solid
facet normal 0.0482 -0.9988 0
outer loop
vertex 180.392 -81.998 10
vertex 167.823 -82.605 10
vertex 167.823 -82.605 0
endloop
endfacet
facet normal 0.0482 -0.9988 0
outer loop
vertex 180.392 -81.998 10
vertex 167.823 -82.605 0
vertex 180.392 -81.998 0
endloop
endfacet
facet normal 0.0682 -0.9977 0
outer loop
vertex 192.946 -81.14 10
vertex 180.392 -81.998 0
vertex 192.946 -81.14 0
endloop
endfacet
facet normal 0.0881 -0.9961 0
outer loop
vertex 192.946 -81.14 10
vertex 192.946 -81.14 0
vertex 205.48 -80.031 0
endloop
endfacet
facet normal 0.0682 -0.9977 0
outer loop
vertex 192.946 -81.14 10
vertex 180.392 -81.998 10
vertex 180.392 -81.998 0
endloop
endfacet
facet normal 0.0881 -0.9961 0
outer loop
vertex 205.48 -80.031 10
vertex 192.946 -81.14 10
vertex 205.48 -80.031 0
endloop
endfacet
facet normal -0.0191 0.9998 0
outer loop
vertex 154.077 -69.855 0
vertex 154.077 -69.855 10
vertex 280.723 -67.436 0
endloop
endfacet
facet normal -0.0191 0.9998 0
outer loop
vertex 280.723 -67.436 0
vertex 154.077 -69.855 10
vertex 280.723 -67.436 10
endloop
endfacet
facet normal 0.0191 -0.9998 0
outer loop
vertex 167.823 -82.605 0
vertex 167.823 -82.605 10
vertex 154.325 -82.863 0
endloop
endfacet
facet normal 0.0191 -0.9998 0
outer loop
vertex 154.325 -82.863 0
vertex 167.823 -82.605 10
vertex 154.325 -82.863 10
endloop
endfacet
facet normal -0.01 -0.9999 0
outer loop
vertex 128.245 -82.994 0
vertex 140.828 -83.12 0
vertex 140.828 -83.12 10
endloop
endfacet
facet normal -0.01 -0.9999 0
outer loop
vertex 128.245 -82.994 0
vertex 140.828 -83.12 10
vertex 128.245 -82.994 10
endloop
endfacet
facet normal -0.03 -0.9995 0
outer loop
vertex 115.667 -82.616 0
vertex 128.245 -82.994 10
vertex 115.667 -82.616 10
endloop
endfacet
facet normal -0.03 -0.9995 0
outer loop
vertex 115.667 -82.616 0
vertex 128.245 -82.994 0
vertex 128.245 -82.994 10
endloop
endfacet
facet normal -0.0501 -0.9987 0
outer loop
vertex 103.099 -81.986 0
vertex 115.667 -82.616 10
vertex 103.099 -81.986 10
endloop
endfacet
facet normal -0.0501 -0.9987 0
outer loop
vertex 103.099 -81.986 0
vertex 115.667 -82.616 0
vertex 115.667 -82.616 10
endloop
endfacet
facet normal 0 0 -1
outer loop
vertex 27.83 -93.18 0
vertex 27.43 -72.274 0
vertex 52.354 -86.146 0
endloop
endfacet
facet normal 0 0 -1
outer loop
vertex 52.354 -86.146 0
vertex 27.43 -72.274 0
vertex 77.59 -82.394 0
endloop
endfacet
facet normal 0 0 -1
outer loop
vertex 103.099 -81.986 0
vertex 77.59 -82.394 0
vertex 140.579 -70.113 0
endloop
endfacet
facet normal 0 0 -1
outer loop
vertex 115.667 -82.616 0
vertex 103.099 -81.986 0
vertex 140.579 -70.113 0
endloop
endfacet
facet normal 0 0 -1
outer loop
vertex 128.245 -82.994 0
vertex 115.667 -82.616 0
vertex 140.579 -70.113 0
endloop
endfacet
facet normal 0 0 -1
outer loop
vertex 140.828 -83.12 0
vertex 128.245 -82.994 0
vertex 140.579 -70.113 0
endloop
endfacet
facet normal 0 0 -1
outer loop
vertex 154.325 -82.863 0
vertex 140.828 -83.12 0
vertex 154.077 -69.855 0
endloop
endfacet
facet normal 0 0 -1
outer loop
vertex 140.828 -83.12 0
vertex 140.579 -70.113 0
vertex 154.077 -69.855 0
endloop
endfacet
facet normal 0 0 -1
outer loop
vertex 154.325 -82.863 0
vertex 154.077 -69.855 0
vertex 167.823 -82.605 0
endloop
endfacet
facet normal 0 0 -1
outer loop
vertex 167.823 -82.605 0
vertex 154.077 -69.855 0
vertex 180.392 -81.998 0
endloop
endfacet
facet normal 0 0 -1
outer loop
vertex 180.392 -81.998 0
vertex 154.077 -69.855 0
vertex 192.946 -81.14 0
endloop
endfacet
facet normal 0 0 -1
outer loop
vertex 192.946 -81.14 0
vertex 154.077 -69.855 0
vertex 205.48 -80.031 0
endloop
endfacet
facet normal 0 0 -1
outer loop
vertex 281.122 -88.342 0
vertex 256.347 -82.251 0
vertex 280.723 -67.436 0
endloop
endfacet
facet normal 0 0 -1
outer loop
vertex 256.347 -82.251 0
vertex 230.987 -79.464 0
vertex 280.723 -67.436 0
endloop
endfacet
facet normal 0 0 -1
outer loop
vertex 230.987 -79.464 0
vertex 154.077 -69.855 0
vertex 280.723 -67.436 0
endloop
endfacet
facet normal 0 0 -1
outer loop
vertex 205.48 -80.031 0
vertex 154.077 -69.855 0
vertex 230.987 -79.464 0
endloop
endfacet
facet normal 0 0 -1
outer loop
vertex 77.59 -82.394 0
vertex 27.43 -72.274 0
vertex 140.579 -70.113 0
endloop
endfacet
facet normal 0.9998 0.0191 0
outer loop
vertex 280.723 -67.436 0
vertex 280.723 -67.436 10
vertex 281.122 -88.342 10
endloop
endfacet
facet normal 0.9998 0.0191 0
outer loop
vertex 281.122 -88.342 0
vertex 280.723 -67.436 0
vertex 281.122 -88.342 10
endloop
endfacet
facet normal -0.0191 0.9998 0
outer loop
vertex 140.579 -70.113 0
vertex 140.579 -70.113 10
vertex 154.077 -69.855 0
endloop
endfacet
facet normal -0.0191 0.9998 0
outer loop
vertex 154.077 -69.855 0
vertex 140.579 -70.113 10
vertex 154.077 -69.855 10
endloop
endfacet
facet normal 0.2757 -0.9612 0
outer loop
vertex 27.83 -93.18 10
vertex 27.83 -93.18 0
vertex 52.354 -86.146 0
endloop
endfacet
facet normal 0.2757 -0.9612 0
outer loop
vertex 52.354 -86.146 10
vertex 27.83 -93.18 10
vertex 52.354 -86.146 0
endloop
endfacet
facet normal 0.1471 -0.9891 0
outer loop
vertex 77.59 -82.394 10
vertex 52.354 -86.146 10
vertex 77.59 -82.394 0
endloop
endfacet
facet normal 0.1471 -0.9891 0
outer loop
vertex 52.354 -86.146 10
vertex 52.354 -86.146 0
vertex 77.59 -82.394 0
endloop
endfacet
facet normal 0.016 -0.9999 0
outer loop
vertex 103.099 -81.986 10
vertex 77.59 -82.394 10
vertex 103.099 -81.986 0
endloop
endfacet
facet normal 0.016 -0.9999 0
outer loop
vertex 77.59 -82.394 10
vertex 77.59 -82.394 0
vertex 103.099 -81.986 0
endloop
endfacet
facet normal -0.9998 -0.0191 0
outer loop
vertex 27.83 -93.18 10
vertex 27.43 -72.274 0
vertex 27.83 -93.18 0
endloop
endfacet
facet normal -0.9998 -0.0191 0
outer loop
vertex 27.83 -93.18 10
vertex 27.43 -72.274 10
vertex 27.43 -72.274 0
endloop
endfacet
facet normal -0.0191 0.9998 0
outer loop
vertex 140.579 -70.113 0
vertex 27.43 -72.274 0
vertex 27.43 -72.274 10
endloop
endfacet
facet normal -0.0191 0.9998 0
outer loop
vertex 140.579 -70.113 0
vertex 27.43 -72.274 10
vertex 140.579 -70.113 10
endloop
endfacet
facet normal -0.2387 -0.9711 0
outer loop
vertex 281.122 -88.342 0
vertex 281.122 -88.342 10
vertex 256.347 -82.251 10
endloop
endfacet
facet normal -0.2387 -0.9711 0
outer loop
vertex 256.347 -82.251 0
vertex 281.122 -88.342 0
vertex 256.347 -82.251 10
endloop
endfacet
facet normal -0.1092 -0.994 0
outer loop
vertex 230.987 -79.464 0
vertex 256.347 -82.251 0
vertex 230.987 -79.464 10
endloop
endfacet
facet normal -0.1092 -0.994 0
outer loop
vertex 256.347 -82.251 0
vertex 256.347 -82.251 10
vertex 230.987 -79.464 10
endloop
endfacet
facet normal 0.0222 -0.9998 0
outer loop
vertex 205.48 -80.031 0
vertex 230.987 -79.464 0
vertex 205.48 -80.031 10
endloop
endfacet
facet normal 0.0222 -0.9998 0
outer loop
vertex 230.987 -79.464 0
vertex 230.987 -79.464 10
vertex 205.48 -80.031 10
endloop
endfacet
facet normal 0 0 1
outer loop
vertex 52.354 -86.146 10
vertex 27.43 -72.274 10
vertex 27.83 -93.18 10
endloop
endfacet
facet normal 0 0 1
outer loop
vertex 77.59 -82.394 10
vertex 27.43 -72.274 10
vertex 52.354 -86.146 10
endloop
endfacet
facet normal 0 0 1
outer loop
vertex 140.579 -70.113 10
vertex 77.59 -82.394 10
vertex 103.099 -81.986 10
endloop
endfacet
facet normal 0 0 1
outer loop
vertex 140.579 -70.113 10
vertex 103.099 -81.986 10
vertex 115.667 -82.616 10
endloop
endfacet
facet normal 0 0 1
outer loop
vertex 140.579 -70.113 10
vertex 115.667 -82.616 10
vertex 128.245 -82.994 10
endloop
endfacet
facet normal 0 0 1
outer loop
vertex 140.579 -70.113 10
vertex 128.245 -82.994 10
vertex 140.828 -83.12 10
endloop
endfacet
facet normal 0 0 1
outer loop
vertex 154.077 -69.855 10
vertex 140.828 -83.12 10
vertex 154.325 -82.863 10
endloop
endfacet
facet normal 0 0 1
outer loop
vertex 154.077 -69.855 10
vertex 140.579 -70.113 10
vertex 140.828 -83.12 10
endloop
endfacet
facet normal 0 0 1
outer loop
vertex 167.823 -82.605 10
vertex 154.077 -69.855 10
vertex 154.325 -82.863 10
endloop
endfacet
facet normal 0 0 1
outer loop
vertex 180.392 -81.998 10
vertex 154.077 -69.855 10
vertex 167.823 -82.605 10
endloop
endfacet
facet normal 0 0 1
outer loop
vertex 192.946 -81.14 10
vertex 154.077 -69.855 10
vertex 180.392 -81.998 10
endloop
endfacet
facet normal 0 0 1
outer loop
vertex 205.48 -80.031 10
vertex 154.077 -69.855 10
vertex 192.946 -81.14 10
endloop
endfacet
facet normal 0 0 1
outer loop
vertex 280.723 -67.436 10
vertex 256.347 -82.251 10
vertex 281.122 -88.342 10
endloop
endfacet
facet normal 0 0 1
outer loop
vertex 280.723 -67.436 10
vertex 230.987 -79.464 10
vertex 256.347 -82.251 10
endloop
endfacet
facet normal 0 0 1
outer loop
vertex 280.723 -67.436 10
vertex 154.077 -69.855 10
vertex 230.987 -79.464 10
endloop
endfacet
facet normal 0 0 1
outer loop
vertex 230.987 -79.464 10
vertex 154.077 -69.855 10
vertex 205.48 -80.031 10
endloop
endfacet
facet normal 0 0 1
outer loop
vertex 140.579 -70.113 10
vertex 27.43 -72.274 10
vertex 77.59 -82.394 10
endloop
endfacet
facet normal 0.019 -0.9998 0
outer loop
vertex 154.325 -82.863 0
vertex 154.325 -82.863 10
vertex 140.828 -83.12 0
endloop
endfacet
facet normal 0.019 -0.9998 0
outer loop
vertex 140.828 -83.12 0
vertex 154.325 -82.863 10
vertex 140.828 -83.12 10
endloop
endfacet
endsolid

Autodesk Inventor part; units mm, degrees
ref_plane "YZ Plane" through (0, 0, 0) normal (1, 0, 0) x (0, 1, 0)
ref_plane "XZ Plane" through (0, 0, 0) normal (0, 1, 0) x (-1, 0, 0)
ref_plane "XY Plane" through (0, 0, 0) normal (0, 0, 1) x (1, 0, 0)
sketch "Sketch1" plane through (0, 0, 0) normal (0, 0, 1) x (1, 0, 0)
  line L0 (0, 0) -> (293.4944, 0) construction
  line L1 (293.4944, 0) -> (293.4944, -132.0217) construction
  line L2 (293.4944, -132.0217) -> (0, -132.0217) construction
  line L3 (0, -132.0217) -> (0, 0) construction
  line L4 (79.3681, -56.3049) -> (159.3681, -56.3049) construction
  line L5 (283.1562, -93.1287) -> (274.2161, -88.6482) construction
  line L6 (283.1562, -93.1287) -> (282.3201, -93.1287) construction
  line L7 (18.3483, -97.5091) -> (27.4302, -93.3236) construction
  line L8 (18.3483, -97.5091) -> (20.5956, -97.5091) construction
  arc A0 (103.0994, -81.9859) -> (27.4302, -93.3236) centre (93.4367, -275.677) ccw
  arc A1 (274.2161, -88.6482) -> (204.4098, -79.893) centre (217.7822, -255.937) ccw
  arc A2 (103.0994, -81.9859) -> (204.4098, -79.893) centre (140.8276, 544.7964) ccw
  line L9 (27.4302, -93.3236) -> (27.4302, -72.2735)
  line L10 (27.4302, -72.2735) -> (272.6166, -67.591)
  line L11 (272.6166, -67.591) -> (274.2161, -88.6482)
  line L12 (103.0994, -81.9859) -> (86.3195, -71.1488) construction
  line L13 (204.4098, -79.893) -> (220.9707, -68.5773) construction
  line L14 (86.3195, -71.1488) -> (86.3195, -81.1488) construction
  line L15 (86.3195, -81.1488) -> (103.0994, -81.9859) construction
  line L16 (220.9707, -68.5773) -> (221.7303, -78.5773) construction
  line L17 (221.7303, -78.5773) -> (204.4098, -79.893) construction
  dimension "d5" = 80
  dimension "d85" = 10
  dimension "d87" = 26.619
  dimension "d92" = 10
  dimension "d94" = 24.743
  dimension "d100" = 22.985
  dimension "d101" = 22.755
  dimension "d106" = 10
  dimension "d111" = 10
  dimension "d112" = 30
  dimension "d113" = 30
extrude "Extrusion1" add sketch "Sketch1" along normal blind 10
sketch "Sketch2" plane through (0, 0, 10) normal (0, 0, 1) x (1, 0, 0)
  arc A0 (103.0994, -81.9859) -> (204.4098, -79.893) centre (140.8276, 544.7964) ccw projected
  line L0 (272.6166, -67.591) -> (27.4302, -72.2735) projected
  line L1 (27.4302, -72.2735) -> (27.4302, -93.3236) projected
  line L2 (274.2161, -88.6482) -> (272.6166, -67.591) projected
  line L3 (125.3768, -83.1204) -> (158.7723, -83.1204)
  line L4 (140.8276, -83.1204) -> (140.8276, -70.1078)
  line L5 (140.8276, -76.6141) -> (27.4302, -76.6141)
  line L6 (140.8276, -76.6141) -> (273.302, -76.6141)
  arc A1 (274.2161, -88.6482) -> (204.4098, -79.893) centre (217.7822, -255.937) ccw projected
  line L7 (274.2161, -88.6482) -> (272.6166, -67.591) projected
  line L8 (272.6166, -67.591) -> (27.4302, -72.2735) projected
  line L9 (27.4302, -72.2735) -> (27.4302, -93.3236) projected
  arc A2 (103.0994, -81.9859) -> (27.4302, -93.3236) centre (93.4367, -275.677) ccw projected
  arc A3 (103.0994, -81.9859) -> (204.4098, -79.893) centre (140.8276, 544.7964) ccw projected
  line L10 (140.8276, -83.1204) -> (140.4575, -63.7401)
  point P0 (0, 0)
  point P1 (204.4098, -79.893)
  point P2 (140.5792, -70.1126)
  point P3 (140.7034, -76.6141)
  dimension "d121" = 113.3974
  dimension "d122" = 132.4743
extrude "Extrusion2" cut sketch "Sketch2" against normal blind 10 contours L4 L6 L2 A1 A0 | L10 L5 L4 | L5 L10 L0 L4 | L4 L0 L2 L6
sketch "Sketch4" plane through (0, 0, 10) normal (0, 0, 1) x (1, 0, 0)
  line L0 (140.5792, -70.1126) -> (27.4302, -72.2735) projected
  line L1 (27.4302, -72.2735) -> (27.4302, -93.3236) projected
  arc A0 (103.0994, -81.9859) -> (27.4302, -93.3236) centre (93.4367, -275.677) ccw projected
  arc A1 (103.0994, -81.9859) -> (140.8276, -83.1204) centre (140.8276, 544.7964) ccw projected
  line L2 (27.4302, -72.2735) -> (27.4302, -93.3236) projected
  arc A2 (103.0994, -81.9859) -> (27.4302, -93.3236) centre (93.4367, -275.677) ccw projected
  line L3 (27.4302, -72.2735) -> (27.8295, -93.1796)
  line L4 (140.8276, -83.1204) -> (140.5792, -70.1126) projected
  point P0 (0, 0)
  point P1 (253.7282, -67.9517)
  dimension "d128" = 90
extrude "Extrusion4" cut sketch "Sketch4" against normal blind 10 contours L3 A0 L1
sketch "Sketch6" plane through (0, 0, 10) normal (0, 0, 1) x (1, 0, 0)
  line L0 (27.4302, -72.2735) -> (27.8295, -93.1796) projected
  arc A0 (103.0994, -81.9859) -> (27.8295, -93.1796) centre (93.4367, -275.677) ccw projected
  arc A1 (103.0994, -81.9859) -> (140.8276, -83.1204) centre (140.8276, 544.7964) ccw projected
  line L1 (140.8276, -83.1204) -> (140.5792, -70.1126) projected
  line L2 (140.5792, -70.1126) -> (27.4302, -72.2735) projected
  line L3 (140.5792, -70.1126) -> (27.4302, -72.2735) projected
  line L4 (140.5792, -70.1126) -> (154.0767, -69.8548)
  line L5 (154.0767, -69.8548) -> (154.3252, -82.8626)
  line L6 (140.5792, -70.1126) -> (140.8276, -83.1204) projected
  line L7 (154.3252, -82.8626) -> (140.8276, -83.1204)
  point P0 (0, 0)
  dimension "d131" = 13.5
  dimension "d132" = 0
  dimension "d135" = 180
extrude "Extrusion5" add sketch "Sketch6" against normal blind 10 contours L4 L5 L7 L1
sketch "Sketch7" plane through (0, 0, 10) normal (0, 0, 1) x (1, 0, 0)
  line L0 (27.4302, -72.2735) -> (27.8295, -93.1796) projected
  arc A0 (103.0994, -81.9859) -> (27.8295, -93.1796) centre (93.4367, -275.677) ccw projected
  arc A1 (103.0994, -81.9859) -> (140.8276, -83.1204) centre (140.8276, 544.7964) ccw projected
  line L1 (140.8276, -83.1204) -> (154.3252, -82.8626) projected
  line L2 (154.3252, -82.8626) -> (154.0767, -69.8548) projected
  line L3 (154.0767, -69.8548) -> (27.4302, -72.2735) projected
  line L4 (280.7233, -67.4361) -> (281.1225, -88.3423)
  arc A2 (281.1225, -88.3423) -> (205.4801, -80.0307) centre (222.5312, -273.2116) ccw
  arc A3 (167.8227, -82.6048) -> (205.4801, -80.0307) centre (143.8479, 544.854) ccw
  line L5 (167.8227, -82.6048) -> (154.3252, -82.8626)
  line L6 (154.0767, -69.8548) -> (280.7233, -67.4361)
  point P0 (0, 0)
extrude "Extrusion6" add sketch "Sketch7" against normal blind 10 contours L6 L4 A2 A3 L5 L2
equation "\"d111\" = d106"
equation "\"d113\" = d112"
properties part number "deseczka_dol_check - 6"
